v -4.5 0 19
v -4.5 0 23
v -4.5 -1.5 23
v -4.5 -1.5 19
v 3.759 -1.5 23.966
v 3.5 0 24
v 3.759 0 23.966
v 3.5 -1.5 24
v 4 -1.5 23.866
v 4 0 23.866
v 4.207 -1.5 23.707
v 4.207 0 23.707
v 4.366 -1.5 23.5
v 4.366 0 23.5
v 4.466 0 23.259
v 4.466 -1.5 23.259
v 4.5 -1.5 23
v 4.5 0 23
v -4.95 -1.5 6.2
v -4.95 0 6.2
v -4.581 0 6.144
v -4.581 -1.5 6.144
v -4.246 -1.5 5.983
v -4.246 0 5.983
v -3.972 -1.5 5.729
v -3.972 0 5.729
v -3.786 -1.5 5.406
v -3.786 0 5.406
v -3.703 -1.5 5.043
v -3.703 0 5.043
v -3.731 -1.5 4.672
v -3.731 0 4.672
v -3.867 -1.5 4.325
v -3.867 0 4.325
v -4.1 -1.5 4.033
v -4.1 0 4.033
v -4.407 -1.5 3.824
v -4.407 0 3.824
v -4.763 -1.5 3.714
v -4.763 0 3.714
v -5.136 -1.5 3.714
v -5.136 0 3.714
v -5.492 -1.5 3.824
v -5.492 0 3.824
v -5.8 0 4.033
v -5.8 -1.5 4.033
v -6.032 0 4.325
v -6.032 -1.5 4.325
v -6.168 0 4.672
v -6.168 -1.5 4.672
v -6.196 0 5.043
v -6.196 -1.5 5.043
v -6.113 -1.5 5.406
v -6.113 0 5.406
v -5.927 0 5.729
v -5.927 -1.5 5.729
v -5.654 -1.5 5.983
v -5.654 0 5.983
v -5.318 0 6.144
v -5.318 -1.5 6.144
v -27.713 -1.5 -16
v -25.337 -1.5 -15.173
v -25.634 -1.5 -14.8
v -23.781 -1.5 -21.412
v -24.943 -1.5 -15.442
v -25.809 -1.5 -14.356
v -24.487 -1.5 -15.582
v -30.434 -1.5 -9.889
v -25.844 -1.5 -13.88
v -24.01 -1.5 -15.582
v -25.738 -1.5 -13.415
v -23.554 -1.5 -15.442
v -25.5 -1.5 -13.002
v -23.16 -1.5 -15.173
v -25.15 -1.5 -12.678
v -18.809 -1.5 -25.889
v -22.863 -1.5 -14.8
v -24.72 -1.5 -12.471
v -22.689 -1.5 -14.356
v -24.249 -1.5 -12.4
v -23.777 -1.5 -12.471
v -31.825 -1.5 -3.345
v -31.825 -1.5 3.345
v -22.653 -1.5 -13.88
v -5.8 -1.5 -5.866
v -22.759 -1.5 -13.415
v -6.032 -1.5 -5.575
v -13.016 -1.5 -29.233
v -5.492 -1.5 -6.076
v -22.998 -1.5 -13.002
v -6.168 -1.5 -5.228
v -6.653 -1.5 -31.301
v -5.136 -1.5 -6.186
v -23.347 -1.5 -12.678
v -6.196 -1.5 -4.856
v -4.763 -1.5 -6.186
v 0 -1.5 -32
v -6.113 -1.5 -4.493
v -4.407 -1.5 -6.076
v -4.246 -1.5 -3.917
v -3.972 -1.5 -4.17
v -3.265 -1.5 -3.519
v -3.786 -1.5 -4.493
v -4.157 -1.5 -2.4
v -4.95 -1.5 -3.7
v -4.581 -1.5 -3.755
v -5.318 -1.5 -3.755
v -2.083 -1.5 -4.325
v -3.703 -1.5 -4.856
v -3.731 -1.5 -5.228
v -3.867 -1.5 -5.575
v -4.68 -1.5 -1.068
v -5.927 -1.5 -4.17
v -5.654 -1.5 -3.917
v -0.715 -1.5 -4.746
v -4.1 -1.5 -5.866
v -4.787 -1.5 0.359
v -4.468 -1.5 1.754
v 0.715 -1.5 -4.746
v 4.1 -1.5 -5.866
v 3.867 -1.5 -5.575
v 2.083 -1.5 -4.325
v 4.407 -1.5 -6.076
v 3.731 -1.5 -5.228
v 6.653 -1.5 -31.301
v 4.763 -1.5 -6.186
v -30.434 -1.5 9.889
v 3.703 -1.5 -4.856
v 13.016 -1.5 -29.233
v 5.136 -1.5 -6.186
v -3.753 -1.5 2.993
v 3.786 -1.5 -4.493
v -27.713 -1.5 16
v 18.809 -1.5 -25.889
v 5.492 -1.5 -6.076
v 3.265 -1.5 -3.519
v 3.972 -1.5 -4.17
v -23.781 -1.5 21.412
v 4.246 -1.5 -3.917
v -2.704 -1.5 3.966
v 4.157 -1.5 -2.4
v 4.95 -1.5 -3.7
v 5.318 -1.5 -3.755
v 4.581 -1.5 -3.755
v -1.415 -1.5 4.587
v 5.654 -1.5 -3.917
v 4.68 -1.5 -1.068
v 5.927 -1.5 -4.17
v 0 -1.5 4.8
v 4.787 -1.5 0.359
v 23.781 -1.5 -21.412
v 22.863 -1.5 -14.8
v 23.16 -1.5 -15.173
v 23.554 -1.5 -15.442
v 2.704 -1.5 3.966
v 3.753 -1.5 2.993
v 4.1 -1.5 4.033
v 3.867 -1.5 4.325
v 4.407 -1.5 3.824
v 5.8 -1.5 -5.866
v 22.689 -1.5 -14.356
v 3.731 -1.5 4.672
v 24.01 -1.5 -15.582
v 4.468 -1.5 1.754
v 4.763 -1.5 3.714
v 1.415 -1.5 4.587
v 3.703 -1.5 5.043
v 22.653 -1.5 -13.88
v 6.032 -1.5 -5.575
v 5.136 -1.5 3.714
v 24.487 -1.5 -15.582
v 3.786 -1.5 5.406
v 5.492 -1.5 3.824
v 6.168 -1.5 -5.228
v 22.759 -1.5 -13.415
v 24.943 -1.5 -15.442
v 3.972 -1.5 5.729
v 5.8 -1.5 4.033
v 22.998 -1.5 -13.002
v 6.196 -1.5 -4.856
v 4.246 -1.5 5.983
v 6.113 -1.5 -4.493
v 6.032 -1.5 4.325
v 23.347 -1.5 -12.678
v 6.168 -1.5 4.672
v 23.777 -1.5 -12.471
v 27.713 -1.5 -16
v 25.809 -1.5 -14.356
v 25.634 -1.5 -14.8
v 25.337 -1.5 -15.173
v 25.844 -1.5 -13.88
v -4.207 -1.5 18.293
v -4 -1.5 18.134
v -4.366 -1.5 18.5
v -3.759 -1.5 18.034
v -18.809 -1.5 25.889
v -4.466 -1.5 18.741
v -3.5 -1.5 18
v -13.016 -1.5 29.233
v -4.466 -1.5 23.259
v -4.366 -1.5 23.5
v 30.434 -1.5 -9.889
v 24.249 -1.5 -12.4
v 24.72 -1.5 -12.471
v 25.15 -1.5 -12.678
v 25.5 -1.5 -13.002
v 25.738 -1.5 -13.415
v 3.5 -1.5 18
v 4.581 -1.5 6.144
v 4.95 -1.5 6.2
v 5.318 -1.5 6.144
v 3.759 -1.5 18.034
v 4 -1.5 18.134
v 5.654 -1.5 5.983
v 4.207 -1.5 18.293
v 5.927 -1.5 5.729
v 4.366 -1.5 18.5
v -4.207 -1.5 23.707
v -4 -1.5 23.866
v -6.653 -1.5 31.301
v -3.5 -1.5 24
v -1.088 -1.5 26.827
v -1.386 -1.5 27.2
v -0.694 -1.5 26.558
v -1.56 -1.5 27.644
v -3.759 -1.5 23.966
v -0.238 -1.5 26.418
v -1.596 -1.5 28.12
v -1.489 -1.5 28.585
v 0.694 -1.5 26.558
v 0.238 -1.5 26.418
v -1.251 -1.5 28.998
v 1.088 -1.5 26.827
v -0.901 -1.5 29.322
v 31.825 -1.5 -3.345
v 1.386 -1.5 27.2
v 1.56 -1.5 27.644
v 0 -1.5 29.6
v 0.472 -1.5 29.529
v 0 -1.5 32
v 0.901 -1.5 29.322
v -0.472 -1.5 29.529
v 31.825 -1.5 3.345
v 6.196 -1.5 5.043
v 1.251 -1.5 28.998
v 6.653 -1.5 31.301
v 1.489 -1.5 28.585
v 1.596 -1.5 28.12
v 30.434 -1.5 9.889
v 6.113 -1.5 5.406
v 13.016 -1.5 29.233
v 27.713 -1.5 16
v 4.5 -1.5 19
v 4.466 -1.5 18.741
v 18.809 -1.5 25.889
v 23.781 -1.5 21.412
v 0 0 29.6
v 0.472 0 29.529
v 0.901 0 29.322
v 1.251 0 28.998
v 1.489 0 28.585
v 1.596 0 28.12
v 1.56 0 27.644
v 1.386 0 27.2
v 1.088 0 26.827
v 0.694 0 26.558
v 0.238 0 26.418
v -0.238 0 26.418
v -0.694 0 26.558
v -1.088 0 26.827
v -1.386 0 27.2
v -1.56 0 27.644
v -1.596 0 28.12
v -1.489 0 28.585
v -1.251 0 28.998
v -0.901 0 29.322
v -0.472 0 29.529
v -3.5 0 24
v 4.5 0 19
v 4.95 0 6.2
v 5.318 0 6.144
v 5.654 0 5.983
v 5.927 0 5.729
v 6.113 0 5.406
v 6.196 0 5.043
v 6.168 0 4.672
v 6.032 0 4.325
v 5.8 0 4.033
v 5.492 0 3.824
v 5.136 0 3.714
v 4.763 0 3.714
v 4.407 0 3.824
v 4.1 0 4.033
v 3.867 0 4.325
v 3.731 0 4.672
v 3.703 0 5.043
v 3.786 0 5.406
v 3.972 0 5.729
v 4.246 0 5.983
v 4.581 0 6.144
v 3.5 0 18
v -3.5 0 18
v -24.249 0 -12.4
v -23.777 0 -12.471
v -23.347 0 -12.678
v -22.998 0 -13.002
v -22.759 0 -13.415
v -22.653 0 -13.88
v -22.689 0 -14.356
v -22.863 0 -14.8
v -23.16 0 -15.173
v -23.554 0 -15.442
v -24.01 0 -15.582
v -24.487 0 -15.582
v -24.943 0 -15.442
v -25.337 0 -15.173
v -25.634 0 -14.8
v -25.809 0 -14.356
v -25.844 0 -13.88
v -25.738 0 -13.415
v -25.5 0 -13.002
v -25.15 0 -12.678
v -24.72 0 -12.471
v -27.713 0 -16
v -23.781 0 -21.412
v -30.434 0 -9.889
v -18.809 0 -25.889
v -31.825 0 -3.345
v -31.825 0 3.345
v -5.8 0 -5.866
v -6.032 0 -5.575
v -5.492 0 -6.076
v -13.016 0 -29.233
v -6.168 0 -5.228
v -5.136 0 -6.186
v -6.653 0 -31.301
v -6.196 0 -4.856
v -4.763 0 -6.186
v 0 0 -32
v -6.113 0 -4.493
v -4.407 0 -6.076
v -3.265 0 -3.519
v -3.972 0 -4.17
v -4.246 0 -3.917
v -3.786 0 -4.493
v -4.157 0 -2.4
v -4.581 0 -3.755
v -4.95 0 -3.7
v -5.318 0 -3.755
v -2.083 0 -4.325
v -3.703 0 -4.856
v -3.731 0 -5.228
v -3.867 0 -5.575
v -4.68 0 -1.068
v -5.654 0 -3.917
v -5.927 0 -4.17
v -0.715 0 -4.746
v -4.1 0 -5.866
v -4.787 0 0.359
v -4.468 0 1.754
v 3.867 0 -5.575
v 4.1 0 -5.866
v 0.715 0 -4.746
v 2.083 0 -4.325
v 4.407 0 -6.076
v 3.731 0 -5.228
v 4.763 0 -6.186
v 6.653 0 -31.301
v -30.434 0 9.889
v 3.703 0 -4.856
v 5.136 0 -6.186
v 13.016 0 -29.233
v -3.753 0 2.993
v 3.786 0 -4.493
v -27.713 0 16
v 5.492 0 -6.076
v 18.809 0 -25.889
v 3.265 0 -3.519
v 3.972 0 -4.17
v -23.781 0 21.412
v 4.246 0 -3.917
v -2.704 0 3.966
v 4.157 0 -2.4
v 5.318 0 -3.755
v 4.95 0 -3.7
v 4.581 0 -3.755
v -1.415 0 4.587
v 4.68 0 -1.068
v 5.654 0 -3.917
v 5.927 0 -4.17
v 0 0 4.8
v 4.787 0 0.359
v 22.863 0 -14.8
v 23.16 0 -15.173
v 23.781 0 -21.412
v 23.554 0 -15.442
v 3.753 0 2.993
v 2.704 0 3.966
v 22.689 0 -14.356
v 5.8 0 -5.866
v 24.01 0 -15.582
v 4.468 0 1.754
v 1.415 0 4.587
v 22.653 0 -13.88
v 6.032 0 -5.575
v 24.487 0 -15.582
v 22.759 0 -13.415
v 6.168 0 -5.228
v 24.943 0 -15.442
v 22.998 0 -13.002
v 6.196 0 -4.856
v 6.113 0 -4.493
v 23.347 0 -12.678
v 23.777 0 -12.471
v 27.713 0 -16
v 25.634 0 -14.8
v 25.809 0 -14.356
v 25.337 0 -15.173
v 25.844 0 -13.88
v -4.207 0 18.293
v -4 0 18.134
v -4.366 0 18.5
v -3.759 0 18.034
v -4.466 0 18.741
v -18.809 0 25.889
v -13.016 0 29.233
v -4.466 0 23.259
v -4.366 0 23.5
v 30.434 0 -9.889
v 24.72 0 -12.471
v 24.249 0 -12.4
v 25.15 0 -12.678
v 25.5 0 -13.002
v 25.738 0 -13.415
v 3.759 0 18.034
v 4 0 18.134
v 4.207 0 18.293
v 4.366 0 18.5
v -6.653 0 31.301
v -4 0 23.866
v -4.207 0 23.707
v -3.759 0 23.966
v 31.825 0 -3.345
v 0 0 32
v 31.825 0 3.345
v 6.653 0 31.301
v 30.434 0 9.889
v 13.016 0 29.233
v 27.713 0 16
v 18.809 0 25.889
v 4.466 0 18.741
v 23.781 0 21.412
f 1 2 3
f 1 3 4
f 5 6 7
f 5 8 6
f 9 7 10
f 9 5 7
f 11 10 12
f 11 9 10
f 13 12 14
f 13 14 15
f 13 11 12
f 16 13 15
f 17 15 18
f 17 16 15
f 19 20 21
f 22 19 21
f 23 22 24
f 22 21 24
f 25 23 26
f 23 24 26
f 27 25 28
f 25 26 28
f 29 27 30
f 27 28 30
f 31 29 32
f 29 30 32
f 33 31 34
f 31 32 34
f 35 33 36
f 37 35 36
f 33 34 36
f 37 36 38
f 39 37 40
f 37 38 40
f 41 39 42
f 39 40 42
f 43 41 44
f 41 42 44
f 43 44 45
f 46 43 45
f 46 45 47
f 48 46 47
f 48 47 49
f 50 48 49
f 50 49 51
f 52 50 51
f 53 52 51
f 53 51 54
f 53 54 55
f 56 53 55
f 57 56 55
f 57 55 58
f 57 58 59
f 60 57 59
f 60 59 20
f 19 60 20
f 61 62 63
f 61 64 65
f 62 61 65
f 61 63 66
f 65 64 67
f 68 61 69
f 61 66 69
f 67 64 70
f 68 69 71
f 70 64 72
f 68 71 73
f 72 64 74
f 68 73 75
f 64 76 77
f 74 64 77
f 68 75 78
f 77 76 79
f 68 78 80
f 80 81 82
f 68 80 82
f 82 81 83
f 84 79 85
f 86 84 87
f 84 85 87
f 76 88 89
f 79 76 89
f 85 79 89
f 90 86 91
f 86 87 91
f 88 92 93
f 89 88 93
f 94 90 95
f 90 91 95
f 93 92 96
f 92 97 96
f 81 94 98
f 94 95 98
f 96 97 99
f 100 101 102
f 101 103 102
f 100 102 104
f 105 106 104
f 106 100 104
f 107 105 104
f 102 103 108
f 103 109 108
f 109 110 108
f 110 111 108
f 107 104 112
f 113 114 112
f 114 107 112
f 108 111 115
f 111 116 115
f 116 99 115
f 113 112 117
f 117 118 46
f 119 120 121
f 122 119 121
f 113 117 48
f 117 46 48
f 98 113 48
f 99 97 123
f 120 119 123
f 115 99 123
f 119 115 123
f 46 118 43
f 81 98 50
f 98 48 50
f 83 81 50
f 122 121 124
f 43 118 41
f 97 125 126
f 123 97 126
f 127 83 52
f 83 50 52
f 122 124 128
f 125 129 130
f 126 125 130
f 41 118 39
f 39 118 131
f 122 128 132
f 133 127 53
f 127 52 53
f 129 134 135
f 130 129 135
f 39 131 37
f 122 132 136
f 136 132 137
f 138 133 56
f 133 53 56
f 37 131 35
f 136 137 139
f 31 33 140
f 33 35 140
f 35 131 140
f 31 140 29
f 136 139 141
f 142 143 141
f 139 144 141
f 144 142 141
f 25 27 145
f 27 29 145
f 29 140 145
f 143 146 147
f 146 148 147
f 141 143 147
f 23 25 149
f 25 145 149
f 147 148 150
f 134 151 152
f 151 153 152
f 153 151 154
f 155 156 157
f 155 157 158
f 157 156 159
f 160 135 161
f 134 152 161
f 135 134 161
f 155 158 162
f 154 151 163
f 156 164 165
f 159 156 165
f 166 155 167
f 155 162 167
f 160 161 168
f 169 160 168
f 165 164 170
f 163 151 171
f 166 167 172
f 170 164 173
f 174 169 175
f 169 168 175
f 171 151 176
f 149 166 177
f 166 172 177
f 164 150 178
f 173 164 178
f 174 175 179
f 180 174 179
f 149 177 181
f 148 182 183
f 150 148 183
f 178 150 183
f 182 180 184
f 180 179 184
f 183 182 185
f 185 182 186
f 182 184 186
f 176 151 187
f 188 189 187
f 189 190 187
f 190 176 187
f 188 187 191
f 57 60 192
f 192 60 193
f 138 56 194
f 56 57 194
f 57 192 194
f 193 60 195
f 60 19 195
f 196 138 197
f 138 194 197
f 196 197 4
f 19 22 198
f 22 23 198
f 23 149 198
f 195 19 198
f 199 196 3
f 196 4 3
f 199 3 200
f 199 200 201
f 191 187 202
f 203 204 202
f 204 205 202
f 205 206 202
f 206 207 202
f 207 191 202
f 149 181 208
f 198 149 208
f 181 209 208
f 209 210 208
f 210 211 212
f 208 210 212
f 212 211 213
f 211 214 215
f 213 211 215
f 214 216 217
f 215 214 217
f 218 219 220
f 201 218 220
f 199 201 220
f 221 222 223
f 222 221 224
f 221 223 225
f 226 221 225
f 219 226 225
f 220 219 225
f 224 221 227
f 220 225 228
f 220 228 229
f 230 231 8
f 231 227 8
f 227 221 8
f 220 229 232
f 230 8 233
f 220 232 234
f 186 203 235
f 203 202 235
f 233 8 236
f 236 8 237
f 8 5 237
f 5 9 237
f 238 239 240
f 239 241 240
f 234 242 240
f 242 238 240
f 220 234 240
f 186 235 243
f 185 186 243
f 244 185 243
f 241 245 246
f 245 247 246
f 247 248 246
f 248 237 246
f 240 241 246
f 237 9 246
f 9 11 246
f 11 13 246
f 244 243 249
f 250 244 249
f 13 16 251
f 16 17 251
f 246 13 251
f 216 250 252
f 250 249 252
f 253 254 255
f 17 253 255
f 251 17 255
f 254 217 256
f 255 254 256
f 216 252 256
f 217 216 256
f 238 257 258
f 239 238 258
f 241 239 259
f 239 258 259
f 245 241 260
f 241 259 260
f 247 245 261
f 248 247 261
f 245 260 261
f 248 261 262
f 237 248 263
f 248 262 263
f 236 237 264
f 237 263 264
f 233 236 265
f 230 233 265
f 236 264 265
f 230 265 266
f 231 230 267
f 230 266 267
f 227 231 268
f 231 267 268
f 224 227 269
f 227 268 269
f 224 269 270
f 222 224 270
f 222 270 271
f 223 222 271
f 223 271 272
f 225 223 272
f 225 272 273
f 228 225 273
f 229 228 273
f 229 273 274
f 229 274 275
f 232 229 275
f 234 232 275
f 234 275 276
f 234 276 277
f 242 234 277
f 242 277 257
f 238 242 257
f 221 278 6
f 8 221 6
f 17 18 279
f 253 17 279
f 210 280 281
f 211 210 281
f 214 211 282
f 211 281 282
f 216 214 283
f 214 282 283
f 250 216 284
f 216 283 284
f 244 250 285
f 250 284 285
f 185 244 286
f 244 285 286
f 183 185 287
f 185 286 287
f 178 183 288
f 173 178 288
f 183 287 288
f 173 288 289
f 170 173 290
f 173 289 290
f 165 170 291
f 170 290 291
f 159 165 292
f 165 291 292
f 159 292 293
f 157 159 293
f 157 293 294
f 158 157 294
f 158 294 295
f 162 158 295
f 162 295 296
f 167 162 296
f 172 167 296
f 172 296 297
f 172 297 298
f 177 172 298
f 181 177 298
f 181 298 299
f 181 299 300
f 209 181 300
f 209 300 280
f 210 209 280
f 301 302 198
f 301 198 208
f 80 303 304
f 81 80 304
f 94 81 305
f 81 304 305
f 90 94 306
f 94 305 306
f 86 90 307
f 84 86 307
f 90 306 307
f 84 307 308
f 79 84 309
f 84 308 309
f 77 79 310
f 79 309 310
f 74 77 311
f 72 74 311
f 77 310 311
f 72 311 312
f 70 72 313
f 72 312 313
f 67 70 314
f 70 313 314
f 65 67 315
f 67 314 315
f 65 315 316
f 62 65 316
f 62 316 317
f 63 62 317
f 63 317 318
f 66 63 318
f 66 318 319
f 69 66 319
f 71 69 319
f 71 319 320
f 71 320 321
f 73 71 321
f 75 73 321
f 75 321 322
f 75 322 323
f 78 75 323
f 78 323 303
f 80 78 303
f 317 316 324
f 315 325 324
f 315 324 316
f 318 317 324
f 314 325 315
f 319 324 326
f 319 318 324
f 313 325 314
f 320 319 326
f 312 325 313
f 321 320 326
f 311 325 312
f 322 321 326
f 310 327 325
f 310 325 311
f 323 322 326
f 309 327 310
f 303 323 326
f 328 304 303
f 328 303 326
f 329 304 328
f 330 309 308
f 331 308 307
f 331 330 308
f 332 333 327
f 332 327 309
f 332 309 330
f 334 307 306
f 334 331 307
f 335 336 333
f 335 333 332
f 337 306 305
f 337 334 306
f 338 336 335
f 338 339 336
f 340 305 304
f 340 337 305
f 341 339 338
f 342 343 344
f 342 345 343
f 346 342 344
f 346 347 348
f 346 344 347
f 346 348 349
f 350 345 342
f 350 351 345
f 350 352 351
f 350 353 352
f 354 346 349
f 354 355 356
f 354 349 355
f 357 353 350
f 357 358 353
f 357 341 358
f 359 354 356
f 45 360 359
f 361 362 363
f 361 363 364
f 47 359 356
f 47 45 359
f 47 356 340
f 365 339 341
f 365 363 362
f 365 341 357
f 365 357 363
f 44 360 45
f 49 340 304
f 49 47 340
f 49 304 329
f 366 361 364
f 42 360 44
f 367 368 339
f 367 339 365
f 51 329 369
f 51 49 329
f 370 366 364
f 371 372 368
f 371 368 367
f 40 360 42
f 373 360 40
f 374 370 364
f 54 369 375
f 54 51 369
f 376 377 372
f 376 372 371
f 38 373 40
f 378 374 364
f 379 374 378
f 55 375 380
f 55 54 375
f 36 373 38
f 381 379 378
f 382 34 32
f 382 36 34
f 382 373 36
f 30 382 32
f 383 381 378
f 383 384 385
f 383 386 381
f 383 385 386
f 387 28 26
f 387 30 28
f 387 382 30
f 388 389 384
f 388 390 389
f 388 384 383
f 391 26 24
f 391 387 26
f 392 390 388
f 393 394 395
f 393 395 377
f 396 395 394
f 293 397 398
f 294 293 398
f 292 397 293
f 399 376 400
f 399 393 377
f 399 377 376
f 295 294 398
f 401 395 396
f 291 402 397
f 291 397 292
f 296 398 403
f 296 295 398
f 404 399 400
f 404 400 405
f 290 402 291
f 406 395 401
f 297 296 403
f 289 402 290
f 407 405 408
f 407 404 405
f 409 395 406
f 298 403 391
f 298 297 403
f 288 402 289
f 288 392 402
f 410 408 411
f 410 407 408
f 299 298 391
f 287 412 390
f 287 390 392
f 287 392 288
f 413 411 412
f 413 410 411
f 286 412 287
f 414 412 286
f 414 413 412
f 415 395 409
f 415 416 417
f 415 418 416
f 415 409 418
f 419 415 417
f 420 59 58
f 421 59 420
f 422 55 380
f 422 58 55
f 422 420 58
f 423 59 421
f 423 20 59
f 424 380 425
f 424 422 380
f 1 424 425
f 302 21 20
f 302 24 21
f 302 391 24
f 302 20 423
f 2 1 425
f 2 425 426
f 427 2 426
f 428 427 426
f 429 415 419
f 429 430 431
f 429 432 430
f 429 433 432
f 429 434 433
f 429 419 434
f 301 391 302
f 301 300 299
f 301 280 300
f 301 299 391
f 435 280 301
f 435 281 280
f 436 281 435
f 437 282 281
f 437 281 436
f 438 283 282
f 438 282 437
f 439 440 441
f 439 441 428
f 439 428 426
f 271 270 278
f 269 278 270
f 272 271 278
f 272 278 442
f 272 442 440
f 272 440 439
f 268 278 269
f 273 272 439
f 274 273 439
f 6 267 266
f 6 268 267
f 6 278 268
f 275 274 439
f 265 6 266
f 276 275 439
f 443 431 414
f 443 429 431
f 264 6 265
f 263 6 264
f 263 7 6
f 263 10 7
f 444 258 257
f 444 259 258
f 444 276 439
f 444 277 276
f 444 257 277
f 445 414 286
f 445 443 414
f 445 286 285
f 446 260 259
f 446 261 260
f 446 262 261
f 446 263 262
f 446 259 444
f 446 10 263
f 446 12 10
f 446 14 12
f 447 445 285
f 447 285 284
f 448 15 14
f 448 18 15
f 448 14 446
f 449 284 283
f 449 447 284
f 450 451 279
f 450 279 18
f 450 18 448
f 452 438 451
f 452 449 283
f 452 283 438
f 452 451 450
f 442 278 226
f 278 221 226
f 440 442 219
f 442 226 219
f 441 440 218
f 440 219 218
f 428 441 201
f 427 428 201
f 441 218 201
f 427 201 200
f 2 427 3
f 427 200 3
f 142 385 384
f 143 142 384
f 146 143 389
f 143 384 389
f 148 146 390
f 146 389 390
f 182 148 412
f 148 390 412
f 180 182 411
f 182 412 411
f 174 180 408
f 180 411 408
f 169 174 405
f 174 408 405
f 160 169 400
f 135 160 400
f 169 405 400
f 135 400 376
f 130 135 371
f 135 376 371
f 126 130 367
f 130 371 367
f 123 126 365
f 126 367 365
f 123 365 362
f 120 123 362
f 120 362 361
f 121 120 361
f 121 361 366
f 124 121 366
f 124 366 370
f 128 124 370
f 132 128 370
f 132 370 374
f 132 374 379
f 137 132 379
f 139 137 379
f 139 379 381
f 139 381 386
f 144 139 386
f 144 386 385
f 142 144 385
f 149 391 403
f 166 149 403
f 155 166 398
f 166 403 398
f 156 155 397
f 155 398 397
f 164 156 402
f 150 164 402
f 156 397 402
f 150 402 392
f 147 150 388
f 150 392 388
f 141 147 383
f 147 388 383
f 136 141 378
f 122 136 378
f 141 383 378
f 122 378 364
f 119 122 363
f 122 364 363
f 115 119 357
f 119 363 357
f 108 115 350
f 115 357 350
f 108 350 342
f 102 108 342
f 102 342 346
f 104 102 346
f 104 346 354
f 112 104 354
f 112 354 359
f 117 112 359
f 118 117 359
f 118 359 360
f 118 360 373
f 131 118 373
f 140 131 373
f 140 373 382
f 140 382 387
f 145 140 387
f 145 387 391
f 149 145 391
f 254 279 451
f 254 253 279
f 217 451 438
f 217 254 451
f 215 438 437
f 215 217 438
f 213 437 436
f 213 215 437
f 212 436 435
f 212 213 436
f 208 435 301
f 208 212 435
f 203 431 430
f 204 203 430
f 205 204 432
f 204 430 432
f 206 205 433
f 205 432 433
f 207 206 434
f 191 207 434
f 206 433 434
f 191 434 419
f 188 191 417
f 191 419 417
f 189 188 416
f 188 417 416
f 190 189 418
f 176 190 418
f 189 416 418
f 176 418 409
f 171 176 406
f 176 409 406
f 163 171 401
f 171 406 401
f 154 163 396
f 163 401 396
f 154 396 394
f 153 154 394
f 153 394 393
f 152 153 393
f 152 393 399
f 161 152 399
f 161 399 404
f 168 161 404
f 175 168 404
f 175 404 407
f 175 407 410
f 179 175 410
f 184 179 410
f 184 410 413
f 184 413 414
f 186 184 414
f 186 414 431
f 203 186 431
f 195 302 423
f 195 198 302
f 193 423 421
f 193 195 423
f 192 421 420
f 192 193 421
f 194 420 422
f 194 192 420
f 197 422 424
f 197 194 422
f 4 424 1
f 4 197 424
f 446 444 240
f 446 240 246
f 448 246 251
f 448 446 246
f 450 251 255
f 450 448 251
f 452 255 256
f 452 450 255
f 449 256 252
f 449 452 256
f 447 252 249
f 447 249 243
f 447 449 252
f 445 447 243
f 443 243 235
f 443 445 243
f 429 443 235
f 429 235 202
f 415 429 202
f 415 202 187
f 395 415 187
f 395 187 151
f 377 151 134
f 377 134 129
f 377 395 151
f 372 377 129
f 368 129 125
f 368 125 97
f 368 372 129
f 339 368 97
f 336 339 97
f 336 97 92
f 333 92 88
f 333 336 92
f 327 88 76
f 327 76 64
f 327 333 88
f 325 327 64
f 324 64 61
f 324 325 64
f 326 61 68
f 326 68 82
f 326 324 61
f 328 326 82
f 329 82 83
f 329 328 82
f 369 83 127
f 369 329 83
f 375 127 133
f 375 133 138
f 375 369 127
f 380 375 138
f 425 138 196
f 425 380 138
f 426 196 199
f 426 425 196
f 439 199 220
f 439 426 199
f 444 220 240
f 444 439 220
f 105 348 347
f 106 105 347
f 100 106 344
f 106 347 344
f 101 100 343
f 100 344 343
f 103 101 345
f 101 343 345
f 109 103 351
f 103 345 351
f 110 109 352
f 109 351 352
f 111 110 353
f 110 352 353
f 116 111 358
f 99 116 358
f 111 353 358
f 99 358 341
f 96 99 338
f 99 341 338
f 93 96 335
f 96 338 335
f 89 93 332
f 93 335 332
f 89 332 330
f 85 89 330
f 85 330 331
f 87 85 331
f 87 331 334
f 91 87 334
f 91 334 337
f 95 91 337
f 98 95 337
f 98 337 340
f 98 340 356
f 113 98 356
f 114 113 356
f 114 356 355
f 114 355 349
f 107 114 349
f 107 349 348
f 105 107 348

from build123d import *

# Parameters (mm, degrees)
SKETCH1_R          = 32
BASE_FLANGE1_DEPTH = 1.5
SKETCH6_R          = 1.6
CUT_EXTRUDE1_DEPTH = 46.279686395
SKETCH7_R          = 4.8
SKETCH7_R_2        = 1.25
CUT_EXTRUDE2_DEPTH = 46.279686395
SKETCH9_W          = 9
SKETCH9_H          = 6
CUT_EXTRUDE3_DEPTH = 46.279686395
FILLET1_R          = 1


# Sheet-metal steps are written as plain solids
with BuildPart() as part:
    # Sketch1 → Base-Flange1 (new body)
    with BuildSketch(Plane(origin=(0, 0, 0), x_dir=(1, 0, 0), z_dir=(0, 1, 0))):
        with Locations(Location((0, 0, 0), (0, 0, 270))):
            Circle(SKETCH1_R)
    extrude(amount=-BASE_FLANGE1_DEPTH)

    # Sketch6 → Cut-Extrude1 (cut, through all)
    with BuildSketch(Plane(origin=(0, 0, 0), x_dir=(1, 0, 0), z_dir=(0, 1, 0))):
        with Locations(Location((0, -28, 0), (0, 0, 270))):
            Circle(SKETCH6_R)
        with Locations(Location((-24.248711306, 14, 0), (0, 0, 270))):
            Circle(SKETCH6_R)
        with Locations(Location((24.248711306, 14, 0), (0, 0, 270))):
            Circle(SKETCH6_R)
    extrude(amount=-CUT_EXTRUDE1_DEPTH, mode=Mode.SUBTRACT)

    # Sketch7 → Cut-Extrude2 (cut, through all)
    with BuildSketch(Plane(origin=(0, 0, 0), x_dir=(1, 0, 0), z_dir=(0, 1, 0))):
        with Locations(Location((0, 0, 0), (0, 0, 270))):
            Circle(SKETCH7_R)
        with Locations(Location((-4.949747468, 4.949747468, 0), (0, 0, 270))):
            Circle(SKETCH7_R_2)
        with Locations(Location((4.949747468, 4.949747468, 0), (0, 0, 270))):
            Circle(SKETCH7_R_2)
        with Locations(Location((4.949747468, -4.949747468, 0), (0, 0, 270))):
            Circle(SKETCH7_R_2)
        with Locations(Location((-4.949747468, -4.949747468, 0), (0, 0, 270))):
            Circle(SKETCH7_R_2)
    extrude(amount=-CUT_EXTRUDE2_DEPTH, mode=Mode.SUBTRACT)

    # Sketch9 → Cut-Extrude3 (cut, through all)
    with BuildSketch(Plane(origin=(0, 0, 0), x_dir=(1, 0, 0), z_dir=(0, 1, 0))):
        with Locations((0, -21)):
            Rectangle(SKETCH9_W, SKETCH9_H)
    extrude(amount=-CUT_EXTRUDE3_DEPTH, mode=Mode.SUBTRACT)

    # Fillet1
    fillet1_edges = [part.edges().sort_by_distance(p)[0] for p in [
        (-4.5, -0.75, 24),
        (-4.5, -0.75, 18),
        (4.5, -0.75, 18),
        (4.5, -0.75, 24),
    ]]
    fillet(fillet1_edges, radius=FILLET1_R)


solid = part.part
